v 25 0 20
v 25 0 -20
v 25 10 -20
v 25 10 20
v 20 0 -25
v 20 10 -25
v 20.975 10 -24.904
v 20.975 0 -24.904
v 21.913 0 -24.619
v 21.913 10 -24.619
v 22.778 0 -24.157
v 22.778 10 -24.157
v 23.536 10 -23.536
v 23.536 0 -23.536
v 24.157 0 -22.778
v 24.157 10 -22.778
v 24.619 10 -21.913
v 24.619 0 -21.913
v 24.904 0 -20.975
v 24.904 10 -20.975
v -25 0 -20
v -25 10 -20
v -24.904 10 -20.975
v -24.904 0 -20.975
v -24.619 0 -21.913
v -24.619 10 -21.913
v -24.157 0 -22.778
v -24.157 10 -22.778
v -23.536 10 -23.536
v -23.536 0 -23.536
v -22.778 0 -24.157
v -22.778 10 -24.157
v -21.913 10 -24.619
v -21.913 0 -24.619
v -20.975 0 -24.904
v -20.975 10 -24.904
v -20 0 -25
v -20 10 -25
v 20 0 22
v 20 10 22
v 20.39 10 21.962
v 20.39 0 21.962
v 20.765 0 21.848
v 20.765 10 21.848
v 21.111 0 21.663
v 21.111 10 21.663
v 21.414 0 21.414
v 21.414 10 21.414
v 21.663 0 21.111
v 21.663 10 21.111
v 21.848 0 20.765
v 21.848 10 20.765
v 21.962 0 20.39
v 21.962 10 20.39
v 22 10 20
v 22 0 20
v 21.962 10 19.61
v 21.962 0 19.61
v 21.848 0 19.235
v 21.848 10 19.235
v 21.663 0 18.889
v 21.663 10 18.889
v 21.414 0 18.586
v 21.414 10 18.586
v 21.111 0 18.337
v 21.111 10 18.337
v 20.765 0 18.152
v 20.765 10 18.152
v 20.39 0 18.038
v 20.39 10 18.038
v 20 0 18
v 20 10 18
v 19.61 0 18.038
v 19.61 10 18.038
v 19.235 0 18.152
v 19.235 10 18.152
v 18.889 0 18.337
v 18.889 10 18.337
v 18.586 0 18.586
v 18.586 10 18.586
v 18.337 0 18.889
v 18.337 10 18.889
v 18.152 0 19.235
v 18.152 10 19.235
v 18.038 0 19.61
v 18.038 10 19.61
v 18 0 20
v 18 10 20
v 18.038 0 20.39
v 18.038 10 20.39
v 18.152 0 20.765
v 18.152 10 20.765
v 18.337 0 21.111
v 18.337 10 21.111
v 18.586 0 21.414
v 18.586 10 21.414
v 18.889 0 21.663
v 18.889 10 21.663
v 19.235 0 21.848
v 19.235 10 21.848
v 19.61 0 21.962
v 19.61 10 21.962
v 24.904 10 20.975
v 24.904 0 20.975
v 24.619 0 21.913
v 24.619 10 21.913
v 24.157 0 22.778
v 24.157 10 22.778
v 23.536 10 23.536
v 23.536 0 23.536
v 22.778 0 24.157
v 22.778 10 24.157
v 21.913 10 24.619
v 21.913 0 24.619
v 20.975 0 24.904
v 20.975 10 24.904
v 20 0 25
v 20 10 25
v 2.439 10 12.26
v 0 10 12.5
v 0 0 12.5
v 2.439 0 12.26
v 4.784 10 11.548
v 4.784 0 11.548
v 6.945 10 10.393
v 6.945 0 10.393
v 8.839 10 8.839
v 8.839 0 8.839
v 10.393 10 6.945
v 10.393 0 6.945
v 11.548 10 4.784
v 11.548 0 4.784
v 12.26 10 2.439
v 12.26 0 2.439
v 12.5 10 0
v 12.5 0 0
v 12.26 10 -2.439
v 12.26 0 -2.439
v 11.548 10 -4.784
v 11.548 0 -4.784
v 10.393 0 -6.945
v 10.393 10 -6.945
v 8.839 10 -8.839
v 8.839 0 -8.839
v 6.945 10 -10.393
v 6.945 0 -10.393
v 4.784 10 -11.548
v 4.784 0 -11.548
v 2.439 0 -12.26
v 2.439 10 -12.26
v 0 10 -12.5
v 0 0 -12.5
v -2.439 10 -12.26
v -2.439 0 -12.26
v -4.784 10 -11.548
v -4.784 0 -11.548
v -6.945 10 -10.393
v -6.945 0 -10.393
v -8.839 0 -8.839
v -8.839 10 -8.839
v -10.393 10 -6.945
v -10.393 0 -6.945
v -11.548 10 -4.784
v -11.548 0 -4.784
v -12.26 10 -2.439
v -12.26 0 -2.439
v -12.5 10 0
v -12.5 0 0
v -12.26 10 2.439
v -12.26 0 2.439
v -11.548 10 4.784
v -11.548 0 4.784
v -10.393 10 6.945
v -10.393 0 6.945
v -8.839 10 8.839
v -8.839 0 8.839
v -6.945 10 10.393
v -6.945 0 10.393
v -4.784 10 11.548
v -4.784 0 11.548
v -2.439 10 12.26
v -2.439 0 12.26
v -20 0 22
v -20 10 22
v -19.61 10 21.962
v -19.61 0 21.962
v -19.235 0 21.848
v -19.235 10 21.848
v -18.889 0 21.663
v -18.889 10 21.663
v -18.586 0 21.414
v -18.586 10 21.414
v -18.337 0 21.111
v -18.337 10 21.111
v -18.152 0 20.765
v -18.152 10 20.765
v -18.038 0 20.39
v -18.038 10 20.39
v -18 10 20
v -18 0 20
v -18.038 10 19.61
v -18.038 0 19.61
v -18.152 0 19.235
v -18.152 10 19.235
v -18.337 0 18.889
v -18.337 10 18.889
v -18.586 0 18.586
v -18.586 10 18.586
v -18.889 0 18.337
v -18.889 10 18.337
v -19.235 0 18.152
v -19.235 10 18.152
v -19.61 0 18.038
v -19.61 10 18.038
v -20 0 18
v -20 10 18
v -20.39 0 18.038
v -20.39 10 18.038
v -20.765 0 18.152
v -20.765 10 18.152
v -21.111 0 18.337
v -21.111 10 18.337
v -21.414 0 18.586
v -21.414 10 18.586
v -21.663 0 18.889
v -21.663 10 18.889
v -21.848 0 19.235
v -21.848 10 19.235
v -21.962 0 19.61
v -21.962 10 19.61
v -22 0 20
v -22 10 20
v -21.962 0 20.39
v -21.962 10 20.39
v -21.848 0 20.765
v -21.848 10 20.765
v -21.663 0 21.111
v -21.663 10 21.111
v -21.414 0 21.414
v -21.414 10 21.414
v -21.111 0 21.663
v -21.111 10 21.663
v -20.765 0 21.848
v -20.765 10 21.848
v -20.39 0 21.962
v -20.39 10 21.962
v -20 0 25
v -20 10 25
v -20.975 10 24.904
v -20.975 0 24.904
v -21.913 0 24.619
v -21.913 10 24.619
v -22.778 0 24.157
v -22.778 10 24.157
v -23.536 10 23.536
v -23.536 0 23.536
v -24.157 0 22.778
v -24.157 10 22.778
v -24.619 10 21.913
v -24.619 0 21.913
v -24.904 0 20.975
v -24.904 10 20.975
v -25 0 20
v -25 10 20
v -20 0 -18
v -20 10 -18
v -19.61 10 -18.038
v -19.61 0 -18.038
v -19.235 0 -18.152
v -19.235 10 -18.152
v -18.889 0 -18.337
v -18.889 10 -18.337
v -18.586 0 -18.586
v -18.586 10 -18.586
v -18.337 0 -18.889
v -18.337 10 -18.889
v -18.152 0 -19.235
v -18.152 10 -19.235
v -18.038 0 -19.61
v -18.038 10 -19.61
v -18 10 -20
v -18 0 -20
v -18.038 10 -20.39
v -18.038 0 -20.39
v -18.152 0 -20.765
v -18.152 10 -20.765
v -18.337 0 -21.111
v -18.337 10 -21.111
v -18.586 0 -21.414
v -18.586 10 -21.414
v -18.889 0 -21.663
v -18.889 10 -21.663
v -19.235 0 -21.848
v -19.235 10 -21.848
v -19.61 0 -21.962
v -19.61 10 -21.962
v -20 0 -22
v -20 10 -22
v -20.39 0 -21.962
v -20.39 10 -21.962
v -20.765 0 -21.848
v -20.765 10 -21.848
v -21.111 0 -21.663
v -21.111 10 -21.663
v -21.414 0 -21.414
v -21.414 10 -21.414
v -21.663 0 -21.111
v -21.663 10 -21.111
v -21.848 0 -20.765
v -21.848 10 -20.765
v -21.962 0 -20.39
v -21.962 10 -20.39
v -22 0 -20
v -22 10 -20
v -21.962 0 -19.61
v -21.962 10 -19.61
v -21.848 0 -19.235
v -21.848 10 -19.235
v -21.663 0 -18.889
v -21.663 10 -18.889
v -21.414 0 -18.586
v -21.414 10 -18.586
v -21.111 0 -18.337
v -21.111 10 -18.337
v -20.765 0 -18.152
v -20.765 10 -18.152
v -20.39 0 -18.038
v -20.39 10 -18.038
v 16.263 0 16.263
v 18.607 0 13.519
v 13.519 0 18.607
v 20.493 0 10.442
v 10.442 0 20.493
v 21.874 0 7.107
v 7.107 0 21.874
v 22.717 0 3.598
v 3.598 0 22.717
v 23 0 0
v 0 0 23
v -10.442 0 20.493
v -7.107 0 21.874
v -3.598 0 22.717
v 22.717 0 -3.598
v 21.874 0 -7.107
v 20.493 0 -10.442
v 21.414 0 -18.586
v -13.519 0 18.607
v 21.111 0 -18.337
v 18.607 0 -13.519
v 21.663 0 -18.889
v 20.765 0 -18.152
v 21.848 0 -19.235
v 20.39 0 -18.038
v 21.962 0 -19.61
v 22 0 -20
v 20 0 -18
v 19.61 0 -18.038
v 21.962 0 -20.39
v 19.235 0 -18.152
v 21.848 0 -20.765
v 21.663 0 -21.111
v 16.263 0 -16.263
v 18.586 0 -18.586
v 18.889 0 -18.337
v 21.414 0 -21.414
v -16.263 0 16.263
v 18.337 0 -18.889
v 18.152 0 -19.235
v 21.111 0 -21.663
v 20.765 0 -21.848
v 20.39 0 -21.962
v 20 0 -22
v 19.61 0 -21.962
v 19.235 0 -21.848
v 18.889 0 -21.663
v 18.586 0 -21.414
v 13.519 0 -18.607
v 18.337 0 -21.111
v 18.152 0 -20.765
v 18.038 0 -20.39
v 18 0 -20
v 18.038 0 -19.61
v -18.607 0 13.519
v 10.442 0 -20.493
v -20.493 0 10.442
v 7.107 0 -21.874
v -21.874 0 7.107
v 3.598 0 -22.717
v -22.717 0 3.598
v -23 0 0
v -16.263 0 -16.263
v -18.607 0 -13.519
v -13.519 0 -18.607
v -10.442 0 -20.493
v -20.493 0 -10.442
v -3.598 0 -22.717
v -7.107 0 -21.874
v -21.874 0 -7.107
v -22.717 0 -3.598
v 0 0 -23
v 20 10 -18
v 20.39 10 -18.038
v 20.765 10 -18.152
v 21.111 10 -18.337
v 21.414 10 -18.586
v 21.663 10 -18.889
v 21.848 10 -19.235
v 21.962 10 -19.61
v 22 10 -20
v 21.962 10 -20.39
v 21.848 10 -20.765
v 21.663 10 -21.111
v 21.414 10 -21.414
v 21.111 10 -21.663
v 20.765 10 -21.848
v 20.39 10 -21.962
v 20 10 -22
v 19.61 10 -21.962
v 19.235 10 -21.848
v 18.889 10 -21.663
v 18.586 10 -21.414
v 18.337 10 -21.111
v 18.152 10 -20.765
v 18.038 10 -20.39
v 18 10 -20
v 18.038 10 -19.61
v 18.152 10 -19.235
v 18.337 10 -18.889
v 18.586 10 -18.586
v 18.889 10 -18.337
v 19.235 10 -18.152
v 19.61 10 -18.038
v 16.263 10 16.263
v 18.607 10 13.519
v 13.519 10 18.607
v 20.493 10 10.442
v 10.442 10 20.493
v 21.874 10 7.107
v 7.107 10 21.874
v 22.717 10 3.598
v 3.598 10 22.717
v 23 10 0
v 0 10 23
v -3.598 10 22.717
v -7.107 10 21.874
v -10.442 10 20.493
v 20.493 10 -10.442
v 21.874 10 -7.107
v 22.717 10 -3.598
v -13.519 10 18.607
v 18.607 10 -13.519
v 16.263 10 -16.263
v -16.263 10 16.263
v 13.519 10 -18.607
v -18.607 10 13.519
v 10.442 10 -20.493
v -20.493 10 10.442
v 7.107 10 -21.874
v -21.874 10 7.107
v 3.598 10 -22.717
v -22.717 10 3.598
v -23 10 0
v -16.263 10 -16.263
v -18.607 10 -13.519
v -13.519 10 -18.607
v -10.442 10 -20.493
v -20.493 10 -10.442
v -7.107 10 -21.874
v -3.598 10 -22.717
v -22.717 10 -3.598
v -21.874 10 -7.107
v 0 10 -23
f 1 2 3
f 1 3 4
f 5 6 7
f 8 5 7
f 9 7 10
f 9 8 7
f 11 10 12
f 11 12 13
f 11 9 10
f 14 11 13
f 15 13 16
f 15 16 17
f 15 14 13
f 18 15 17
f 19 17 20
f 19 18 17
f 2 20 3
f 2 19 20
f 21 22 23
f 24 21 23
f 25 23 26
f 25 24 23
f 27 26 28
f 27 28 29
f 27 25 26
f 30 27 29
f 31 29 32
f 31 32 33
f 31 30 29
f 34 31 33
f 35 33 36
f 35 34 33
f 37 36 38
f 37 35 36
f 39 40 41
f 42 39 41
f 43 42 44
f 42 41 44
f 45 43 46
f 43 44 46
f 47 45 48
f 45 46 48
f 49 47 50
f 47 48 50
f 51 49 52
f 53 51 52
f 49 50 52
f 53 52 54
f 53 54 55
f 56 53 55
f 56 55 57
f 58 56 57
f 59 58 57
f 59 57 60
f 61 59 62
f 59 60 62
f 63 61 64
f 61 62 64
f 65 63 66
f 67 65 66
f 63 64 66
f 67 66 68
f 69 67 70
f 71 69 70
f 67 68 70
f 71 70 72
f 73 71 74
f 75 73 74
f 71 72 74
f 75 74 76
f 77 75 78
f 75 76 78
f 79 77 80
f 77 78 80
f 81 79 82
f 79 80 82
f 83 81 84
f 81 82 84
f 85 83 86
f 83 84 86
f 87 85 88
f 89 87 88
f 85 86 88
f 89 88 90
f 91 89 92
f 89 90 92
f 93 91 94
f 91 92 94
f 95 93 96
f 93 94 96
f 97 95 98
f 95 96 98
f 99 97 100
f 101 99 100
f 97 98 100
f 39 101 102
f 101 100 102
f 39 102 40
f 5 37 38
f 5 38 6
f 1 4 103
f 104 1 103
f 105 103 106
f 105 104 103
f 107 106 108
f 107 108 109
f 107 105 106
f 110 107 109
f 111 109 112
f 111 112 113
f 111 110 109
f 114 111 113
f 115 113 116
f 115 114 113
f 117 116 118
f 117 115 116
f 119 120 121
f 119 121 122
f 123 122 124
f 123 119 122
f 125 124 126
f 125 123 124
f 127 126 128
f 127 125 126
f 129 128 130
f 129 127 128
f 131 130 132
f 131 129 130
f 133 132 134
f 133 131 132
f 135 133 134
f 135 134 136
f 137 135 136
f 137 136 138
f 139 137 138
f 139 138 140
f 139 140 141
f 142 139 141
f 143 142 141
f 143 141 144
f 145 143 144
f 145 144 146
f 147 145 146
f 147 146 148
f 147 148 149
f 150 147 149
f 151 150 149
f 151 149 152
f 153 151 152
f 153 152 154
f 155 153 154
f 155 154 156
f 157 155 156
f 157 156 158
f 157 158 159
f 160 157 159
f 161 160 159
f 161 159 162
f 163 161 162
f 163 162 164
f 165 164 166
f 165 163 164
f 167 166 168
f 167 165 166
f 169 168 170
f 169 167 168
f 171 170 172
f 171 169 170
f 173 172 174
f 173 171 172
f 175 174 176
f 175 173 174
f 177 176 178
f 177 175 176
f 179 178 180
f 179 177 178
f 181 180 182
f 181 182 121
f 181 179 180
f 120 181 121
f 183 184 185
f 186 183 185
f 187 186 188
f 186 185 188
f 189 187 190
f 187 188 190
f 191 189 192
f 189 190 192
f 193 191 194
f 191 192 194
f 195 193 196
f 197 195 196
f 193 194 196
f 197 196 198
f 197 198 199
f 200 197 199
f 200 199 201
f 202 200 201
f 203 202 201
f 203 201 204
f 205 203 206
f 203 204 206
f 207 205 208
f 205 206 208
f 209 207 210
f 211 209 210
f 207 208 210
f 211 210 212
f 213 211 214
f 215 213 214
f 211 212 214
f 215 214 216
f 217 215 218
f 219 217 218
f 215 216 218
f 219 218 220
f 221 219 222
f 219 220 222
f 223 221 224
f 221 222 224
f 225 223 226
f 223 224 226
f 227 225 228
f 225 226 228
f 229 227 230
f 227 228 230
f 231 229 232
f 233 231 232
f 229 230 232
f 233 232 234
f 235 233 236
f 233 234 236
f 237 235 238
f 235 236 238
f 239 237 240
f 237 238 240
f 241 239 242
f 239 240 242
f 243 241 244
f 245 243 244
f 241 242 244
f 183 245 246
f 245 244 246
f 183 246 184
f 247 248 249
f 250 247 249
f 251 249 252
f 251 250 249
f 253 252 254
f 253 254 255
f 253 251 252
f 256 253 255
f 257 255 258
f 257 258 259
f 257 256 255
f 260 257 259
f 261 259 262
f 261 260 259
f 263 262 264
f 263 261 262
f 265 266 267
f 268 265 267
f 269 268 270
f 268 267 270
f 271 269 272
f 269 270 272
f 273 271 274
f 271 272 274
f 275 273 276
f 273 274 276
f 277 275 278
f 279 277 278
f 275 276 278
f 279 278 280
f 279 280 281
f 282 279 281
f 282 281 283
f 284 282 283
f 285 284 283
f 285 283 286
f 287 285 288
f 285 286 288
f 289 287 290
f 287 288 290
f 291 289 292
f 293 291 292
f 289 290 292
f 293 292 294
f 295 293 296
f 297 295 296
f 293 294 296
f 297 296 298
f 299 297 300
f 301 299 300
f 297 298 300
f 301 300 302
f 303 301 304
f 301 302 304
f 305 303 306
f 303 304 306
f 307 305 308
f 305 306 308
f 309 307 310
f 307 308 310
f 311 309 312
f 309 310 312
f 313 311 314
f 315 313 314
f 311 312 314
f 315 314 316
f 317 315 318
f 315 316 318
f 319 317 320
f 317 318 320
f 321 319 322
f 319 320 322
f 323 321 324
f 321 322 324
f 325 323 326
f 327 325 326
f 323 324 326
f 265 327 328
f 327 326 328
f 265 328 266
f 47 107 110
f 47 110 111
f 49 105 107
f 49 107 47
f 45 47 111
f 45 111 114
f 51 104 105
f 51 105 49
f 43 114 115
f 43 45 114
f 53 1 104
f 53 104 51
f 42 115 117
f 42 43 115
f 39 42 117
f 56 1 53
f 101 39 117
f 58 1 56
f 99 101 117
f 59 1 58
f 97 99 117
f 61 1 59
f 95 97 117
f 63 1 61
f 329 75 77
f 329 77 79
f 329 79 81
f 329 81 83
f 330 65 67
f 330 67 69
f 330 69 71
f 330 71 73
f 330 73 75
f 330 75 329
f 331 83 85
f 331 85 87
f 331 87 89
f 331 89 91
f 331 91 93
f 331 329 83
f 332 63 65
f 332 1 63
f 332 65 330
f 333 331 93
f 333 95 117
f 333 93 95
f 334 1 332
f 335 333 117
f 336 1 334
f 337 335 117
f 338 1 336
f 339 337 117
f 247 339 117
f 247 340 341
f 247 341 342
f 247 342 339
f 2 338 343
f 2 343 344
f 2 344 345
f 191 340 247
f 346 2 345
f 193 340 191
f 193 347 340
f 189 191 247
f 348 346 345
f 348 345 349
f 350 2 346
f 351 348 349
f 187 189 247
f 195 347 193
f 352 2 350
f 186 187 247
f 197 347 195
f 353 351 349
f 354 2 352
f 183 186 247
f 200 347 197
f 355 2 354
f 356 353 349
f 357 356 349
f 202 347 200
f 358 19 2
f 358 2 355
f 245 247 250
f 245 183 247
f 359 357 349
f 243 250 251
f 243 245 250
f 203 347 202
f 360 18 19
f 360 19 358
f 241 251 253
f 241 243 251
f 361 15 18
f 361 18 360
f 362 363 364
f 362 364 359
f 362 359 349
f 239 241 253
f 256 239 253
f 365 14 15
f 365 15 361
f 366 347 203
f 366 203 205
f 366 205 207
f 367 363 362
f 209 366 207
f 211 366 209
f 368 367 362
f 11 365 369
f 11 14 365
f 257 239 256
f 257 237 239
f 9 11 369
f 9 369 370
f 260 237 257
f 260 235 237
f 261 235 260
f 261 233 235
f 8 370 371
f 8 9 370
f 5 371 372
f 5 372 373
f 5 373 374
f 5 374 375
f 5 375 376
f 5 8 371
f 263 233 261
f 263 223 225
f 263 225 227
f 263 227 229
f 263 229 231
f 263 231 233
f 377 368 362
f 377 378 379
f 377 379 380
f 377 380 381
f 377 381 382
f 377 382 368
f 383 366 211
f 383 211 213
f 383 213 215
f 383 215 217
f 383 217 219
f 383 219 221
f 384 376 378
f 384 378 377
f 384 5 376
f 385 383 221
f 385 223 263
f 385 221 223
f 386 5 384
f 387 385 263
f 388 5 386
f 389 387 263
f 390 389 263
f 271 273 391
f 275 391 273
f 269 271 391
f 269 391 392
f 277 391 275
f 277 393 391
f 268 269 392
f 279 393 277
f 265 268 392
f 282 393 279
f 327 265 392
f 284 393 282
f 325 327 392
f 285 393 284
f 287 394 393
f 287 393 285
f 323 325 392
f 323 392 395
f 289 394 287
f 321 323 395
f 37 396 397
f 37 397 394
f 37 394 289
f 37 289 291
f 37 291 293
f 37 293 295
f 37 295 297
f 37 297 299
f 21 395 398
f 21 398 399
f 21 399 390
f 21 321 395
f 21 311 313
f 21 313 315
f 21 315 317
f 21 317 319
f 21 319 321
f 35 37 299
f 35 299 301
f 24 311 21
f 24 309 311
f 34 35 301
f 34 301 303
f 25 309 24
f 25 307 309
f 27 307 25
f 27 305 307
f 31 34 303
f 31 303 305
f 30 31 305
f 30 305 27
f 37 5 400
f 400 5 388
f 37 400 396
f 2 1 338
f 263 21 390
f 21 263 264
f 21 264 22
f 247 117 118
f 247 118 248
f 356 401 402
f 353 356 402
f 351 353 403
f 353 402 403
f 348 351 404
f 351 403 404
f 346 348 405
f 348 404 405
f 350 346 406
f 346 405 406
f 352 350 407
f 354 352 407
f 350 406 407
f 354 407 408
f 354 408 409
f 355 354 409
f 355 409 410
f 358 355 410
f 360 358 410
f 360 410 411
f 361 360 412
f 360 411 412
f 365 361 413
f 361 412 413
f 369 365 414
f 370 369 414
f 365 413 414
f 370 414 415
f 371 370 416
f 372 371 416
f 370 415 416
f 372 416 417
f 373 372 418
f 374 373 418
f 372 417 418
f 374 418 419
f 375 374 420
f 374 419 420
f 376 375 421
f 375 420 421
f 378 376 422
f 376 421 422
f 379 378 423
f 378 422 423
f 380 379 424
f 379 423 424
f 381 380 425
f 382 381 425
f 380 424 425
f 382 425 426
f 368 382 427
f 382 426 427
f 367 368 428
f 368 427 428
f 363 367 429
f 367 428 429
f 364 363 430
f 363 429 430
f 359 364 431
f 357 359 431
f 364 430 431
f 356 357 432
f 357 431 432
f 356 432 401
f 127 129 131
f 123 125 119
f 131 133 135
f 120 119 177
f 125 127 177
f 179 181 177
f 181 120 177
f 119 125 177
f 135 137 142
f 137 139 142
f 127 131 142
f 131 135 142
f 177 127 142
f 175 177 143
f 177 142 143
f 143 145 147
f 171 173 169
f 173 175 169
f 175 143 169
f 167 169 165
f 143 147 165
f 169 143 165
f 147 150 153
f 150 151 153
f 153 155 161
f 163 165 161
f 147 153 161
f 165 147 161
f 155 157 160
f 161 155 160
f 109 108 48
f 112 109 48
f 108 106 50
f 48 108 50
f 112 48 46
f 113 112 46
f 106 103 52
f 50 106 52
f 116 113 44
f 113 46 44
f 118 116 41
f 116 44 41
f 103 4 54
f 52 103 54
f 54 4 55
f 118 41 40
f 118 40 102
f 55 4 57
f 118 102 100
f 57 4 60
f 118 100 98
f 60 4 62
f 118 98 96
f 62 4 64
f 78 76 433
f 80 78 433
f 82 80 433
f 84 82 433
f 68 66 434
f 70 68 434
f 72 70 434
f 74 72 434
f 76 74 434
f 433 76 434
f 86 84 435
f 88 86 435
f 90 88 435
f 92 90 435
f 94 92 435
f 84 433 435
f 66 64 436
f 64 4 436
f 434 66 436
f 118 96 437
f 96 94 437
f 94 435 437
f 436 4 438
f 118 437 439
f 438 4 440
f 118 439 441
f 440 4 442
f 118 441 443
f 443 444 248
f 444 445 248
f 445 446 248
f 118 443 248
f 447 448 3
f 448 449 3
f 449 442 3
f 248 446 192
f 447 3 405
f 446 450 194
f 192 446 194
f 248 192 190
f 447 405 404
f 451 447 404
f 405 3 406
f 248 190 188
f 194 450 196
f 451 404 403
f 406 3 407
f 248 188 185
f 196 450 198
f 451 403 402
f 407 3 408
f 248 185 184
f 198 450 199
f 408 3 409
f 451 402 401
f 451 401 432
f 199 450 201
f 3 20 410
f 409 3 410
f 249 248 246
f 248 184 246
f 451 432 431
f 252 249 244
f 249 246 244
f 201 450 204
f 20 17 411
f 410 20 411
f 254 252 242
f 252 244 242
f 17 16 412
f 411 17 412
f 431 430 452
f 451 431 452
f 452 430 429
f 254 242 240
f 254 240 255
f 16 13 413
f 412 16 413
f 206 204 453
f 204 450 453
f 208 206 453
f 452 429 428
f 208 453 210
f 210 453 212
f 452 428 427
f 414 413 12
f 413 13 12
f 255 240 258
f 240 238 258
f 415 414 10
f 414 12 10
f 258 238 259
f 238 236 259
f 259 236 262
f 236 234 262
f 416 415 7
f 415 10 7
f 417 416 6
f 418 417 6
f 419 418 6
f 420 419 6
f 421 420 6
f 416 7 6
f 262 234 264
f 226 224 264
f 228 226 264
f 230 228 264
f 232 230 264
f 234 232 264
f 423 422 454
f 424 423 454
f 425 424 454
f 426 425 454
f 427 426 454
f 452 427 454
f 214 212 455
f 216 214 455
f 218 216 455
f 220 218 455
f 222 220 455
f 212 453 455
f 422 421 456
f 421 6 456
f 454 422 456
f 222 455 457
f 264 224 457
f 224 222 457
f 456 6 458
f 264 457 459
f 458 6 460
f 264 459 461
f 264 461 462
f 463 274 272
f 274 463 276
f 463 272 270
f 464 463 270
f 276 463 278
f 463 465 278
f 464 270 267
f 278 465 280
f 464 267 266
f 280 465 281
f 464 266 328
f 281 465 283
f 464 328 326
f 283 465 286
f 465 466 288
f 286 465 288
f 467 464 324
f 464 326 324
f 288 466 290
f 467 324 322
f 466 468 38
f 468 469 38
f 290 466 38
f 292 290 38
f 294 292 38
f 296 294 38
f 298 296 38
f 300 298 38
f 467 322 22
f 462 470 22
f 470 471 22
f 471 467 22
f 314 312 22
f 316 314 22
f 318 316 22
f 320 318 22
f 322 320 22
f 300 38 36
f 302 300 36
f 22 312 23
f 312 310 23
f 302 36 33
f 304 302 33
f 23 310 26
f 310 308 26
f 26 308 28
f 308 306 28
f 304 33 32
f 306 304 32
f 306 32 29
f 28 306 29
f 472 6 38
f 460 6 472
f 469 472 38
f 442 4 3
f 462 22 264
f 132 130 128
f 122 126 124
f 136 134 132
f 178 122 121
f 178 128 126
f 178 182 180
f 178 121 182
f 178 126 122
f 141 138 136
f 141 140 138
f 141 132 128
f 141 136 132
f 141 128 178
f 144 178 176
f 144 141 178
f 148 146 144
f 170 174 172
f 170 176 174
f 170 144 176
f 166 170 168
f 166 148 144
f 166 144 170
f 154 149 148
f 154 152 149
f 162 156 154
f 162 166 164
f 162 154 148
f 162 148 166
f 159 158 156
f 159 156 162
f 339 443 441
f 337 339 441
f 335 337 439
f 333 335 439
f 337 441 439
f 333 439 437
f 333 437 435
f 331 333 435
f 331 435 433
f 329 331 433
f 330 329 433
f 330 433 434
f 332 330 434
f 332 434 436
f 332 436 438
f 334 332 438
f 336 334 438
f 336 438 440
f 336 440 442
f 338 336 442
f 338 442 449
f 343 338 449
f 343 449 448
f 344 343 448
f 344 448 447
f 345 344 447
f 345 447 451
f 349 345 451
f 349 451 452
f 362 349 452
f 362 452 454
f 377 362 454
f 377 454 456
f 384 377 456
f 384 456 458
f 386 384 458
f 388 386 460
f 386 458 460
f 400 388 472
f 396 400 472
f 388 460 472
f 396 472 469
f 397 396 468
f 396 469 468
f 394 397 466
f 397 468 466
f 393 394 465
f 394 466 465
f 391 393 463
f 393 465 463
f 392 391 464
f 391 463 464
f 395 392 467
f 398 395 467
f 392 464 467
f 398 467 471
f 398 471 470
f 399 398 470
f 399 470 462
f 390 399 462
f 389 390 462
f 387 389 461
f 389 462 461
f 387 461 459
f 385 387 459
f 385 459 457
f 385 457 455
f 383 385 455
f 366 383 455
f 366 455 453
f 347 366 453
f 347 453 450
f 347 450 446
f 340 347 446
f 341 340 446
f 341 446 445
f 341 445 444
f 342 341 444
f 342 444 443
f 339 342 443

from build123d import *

# Parameters (mm, degrees)
EXTRUDE_1_DEPTH     = 10
SKETCH_2_R          = 12.5
CUT_EXTRUDE_1_DEPTH = 17
SKETCH_3_R          = 23
EXTRUDE_3_DEPTH     = 10
SKETCH_4_R          = 2
CUT_EXTRUDE_2_DEPTH = 10


with BuildPart() as part:
    # 草图1 → 拉伸1 (new body)
    with BuildSketch(Plane(origin=(0, 0, 0), x_dir=(1, 0, 0), z_dir=(0, 1, 0))):
        with BuildLine():
            Line((-20, 25), (20, 25))
            ThreePointArc((20, 25), (23.535533906, 23.535533906), (25, 20))
            Line((25, 20), (25, -20))
            ThreePointArc((25, -20), (23.535533906, -23.535533906), (20, -25))
            Line((20, -25), (-20, -25))
            ThreePointArc((-20, -25), (-23.535533906, -23.535533906), (-25, -20))
            Line((-25, -20), (-25, 20))
            ThreePointArc((-25, 20), (-23.535533906, 23.535533906), (-20, 25))
        make_face()
    extrude(amount=EXTRUDE_1_DEPTH)

    # 草图2 → 切除-拉伸1 (cut)
    with BuildSketch(Plane(origin=(0, 10, 0), x_dir=(-1, 0, 0), z_dir=(0, 1, 0))):
        with BuildLine():
            Line((-20, -23), (20, -23))
            ThreePointArc((20, -23), (22.121320344, -22.121320344), (23, -20))
            Line((23, -20), (23, 20))
            ThreePointArc((23, 20), (22.121320344, 22.121320344), (20, 23))
            Line((20, 23), (-20, 23))
            ThreePointArc((-20, 23), (-22.121320344, 22.121320344), (-23, 20))
            Line((-23, 20), (-23, -20))
            ThreePointArc((-23, -20), (-22.121320344, -22.121320344), (-20, -23))
        make_face()
        with Locations(Location((0, 0, 0), (0, 0, 90))):
            Circle(SKETCH_2_R, mode=Mode.SUBTRACT)
    extrude(amount=-CUT_EXTRUDE_1_DEPTH, mode=Mode.SUBTRACT)


with BuildPart() as cut_extrude_1_piece_1:
    # of the separate pieces the step leaves, piece 1, a body of its own (cut_extrude_1_pieces)
    add(part.part.solids().sort_by_distance((0, 0, 12.5))[0])


with BuildPart() as cut_extrude_1_piece_2:
    # of the separate pieces the step leaves, piece 2, a body of its own (cut_extrude_1_pieces)
    add(part.part.solids().sort_by_distance((-20, 0, -25))[0])

    # 草图3 → 拉伸3 (add)
    with BuildSketch(Plane(origin=(0, 10, 0), x_dir=(-1, 0, 0), z_dir=(0, 1, 0))):
        with BuildLine():
            Line((25, -20), (25, 20))
            ThreePointArc((25, 20), (23.535533906, 23.535533906), (20, 25))
            Line((20, 25), (-20, 25))
            ThreePointArc((-20, 25), (-23.535533906, 23.535533906), (-25, 20))
            Line((-25, 20), (-25, -20))
            ThreePointArc((-25, -20), (-23.535533906, -23.535533906), (-20, -25))
            Line((-20, -25), (20, -25))
            ThreePointArc((20, -25), (23.535533906, -23.535533906), (25, -20))
        make_face()
        with Locations(Location((0, 0, 0), (0, 0, 90))):
            Circle(SKETCH_3_R, mode=Mode.SUBTRACT)
    extrude(amount=-EXTRUDE_3_DEPTH)

    # 草图4 → 切除-拉伸2 (cut)
    with BuildSketch(Plane(origin=(0, 10, 0), x_dir=(-1, 0, 0), z_dir=(0, 1, 0))):
        with Locations(Location((-20, -20, 0), (0, 0, 90))):
            Circle(SKETCH_4_R)
        with Locations(Location((-20, 20, 0), (0, 0, 90))):
            Circle(SKETCH_4_R)
        with Locations(Location((20, 20, 0), (0, 0, 90))):
            Circle(SKETCH_4_R)
        with Locations(Location((20, -20, 0), (0, 0, 90))):
            Circle(SKETCH_4_R)
    extrude(amount=-CUT_EXTRUDE_2_DEPTH, mode=Mode.SUBTRACT)


solid = Compound([cut_extrude_1_piece_1.part, cut_extrude_1_piece_2.part])
